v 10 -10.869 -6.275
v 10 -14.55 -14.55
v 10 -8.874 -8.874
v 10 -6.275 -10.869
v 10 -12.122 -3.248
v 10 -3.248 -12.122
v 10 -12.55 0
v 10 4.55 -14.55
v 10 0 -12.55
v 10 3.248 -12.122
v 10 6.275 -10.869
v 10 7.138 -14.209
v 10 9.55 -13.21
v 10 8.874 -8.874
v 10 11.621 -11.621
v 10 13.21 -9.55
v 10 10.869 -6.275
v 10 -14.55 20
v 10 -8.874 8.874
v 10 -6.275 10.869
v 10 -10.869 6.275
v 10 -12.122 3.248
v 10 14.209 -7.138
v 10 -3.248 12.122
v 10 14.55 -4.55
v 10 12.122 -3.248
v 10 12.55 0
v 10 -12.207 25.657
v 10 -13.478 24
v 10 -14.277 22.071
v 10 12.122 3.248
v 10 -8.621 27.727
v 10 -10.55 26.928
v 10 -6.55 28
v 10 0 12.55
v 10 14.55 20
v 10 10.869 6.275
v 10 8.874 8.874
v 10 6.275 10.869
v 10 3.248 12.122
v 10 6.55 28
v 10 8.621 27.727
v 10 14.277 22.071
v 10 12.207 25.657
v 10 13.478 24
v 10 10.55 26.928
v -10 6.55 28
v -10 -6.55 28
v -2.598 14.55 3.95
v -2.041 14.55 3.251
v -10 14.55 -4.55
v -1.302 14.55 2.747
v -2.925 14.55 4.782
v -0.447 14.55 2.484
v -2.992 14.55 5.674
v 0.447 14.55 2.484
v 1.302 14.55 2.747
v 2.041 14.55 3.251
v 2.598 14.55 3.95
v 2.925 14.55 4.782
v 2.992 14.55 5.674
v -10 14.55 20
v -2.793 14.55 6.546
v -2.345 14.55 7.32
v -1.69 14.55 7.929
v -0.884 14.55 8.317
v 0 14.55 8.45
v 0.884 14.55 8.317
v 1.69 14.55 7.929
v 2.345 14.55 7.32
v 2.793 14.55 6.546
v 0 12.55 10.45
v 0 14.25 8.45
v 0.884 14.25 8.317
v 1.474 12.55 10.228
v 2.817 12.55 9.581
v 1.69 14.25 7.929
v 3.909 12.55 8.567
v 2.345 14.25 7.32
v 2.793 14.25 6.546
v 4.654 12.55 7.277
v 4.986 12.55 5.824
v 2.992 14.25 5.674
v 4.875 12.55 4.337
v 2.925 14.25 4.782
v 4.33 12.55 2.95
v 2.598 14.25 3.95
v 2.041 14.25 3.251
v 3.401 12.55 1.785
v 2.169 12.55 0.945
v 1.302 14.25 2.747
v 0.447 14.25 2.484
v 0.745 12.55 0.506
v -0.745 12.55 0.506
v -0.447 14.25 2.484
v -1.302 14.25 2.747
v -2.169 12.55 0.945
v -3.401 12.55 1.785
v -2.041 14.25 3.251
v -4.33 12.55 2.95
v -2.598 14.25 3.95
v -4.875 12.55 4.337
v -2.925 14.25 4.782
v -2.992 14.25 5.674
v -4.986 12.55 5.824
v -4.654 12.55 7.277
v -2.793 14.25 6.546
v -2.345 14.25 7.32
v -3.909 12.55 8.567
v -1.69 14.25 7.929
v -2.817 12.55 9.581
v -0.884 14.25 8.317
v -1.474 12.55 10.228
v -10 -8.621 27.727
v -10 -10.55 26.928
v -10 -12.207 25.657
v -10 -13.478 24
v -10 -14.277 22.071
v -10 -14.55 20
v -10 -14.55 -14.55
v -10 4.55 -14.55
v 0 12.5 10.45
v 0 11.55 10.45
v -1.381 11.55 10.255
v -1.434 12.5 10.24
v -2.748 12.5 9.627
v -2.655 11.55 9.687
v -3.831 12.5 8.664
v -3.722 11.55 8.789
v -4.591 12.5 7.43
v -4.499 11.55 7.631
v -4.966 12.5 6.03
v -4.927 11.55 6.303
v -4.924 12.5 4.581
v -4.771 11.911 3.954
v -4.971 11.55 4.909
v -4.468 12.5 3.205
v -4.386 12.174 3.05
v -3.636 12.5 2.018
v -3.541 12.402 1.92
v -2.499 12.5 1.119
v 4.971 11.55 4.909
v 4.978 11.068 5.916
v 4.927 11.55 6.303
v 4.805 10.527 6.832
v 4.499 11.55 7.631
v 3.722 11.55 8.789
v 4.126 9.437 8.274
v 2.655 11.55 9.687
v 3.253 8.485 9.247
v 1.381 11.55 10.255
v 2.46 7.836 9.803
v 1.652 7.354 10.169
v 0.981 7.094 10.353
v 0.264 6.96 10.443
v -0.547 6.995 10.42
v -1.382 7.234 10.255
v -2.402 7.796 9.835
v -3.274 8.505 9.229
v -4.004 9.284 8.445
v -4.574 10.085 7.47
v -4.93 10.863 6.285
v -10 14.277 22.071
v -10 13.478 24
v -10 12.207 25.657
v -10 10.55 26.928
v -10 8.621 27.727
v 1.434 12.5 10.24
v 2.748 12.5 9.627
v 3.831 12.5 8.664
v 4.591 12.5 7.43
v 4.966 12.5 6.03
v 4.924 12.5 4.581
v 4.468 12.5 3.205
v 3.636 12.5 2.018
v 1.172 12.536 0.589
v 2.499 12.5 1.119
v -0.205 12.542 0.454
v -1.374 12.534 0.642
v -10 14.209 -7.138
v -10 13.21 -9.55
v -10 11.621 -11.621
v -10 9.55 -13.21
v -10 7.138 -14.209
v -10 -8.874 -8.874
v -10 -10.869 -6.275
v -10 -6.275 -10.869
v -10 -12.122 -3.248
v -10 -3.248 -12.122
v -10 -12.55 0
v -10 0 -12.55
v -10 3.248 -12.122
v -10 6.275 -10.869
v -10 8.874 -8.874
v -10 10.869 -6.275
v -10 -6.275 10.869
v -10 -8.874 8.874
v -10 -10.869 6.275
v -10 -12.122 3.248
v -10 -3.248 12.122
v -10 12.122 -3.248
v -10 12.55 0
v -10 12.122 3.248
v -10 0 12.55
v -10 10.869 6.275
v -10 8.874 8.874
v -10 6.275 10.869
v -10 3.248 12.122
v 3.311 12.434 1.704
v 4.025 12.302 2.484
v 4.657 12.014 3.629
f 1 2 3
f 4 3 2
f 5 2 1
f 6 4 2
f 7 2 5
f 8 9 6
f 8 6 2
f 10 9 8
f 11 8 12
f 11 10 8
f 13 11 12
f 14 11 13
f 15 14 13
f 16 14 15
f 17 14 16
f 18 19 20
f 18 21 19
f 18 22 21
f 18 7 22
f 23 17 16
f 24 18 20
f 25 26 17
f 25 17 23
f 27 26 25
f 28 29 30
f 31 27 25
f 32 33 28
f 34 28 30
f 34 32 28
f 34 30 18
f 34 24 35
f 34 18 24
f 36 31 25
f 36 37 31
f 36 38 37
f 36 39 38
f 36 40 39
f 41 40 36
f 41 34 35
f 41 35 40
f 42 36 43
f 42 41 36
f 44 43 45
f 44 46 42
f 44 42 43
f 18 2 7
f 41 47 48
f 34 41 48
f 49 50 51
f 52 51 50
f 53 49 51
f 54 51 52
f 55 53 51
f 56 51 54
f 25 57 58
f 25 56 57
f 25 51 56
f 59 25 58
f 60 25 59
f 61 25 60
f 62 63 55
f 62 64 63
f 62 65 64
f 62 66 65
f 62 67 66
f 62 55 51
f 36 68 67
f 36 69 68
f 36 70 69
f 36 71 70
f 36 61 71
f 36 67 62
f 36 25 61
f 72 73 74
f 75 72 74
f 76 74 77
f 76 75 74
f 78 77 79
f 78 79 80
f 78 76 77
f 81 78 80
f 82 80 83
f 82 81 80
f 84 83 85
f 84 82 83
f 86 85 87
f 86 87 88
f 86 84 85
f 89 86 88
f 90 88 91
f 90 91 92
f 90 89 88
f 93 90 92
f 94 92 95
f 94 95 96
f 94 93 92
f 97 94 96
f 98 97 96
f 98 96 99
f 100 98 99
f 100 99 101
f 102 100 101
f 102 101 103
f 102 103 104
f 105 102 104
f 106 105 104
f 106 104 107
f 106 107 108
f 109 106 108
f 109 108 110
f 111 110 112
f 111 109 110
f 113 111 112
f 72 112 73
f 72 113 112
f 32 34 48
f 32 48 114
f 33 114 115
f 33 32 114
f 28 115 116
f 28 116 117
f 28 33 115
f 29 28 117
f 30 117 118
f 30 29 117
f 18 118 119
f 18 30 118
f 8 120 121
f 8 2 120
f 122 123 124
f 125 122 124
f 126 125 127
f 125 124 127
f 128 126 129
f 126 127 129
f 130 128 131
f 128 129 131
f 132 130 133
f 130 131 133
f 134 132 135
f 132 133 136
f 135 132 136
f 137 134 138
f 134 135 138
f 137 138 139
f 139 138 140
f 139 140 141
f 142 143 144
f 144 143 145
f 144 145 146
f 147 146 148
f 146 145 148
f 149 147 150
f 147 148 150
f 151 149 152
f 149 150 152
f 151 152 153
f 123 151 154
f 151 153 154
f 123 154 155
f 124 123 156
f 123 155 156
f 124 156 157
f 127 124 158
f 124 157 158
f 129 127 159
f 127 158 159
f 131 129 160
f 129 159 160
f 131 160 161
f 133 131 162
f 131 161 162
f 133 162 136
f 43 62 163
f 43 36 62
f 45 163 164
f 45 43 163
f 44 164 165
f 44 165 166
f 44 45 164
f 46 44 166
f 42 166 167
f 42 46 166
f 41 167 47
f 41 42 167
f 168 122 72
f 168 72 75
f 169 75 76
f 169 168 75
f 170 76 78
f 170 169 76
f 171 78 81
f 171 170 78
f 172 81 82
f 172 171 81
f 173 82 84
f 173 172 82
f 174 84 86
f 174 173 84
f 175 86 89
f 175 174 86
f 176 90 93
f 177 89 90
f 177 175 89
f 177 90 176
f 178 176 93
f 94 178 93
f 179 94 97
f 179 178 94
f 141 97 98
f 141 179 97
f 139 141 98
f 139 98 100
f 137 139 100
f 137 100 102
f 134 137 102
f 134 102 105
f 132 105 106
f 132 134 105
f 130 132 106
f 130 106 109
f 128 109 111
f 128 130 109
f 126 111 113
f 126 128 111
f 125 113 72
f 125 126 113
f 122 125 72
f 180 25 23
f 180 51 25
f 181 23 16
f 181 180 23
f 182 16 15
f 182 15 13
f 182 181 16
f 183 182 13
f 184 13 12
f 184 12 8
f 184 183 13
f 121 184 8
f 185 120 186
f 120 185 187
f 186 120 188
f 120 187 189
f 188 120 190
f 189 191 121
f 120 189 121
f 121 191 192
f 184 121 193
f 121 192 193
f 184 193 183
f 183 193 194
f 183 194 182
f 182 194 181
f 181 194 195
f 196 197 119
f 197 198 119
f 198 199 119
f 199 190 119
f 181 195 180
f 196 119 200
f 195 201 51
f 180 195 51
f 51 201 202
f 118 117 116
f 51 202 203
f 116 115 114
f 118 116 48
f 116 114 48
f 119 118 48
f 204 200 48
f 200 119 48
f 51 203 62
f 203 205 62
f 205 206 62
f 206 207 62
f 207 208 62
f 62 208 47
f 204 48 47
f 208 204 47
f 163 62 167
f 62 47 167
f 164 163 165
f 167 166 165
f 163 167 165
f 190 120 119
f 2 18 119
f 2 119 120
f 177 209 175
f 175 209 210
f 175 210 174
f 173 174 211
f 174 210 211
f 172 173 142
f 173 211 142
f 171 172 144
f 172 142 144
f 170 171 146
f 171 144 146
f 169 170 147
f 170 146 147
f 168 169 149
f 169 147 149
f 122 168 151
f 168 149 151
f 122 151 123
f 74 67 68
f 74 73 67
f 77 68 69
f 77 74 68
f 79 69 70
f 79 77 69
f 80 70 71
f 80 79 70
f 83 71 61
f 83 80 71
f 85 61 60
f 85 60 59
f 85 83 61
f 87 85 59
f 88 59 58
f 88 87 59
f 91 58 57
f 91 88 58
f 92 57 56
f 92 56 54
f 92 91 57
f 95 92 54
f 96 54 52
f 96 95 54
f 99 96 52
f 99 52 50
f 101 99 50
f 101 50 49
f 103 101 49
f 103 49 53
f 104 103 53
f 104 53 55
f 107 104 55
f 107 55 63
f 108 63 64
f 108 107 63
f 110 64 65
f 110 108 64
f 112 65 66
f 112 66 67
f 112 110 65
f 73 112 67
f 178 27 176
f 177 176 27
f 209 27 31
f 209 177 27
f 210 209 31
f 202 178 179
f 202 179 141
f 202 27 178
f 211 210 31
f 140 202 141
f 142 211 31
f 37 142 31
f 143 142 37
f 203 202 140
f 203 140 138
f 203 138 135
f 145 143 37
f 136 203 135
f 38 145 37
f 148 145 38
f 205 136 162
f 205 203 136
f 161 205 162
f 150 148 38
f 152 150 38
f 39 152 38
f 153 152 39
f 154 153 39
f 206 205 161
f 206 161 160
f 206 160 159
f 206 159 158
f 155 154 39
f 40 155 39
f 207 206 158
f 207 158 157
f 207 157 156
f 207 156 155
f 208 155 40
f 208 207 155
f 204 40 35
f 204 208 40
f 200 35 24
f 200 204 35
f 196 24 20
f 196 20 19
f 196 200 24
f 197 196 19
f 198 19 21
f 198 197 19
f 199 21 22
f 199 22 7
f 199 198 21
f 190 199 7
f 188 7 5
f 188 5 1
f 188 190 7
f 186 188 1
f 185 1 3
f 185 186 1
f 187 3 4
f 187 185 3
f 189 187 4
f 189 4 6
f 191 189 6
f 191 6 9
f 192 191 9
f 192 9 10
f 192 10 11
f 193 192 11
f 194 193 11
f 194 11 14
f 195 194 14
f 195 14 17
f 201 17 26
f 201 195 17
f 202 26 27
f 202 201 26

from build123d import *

# Parameters (mm, degrees)
F0_R     = 12.55
F0_R_2   = 2.75
F0_R_3   = 4
F1_DEPTH = 10
F2_R     = 10
F3_R     = 2.9
F4_DEPTH = 14.551
F3_R_2   = 5
F5_DEPTH = 12.5


with BuildPart() as f1:
    # F0 (on Right) → F1 (new body, symmetric)
    with BuildSketch(Plane.YZ):
        with BuildLine():
            ThreePointArc((14.55, 20), (12.2068542495, 25.6568542495), (6.55, 28))
            Line((6.55, 28), (-6.55, 28))
            ThreePointArc((-6.55, 28), (-12.2068542495, 25.6568542495), (-14.55, 20))
            Line((-14.55, 20), (-14.55, -14.55))
            Line((-14.55, -14.55), (14.55, -14.55))
            Line((14.55, -14.55), (14.55, 20))
        make_face()
        Circle(F0_R, mode=Mode.SUBTRACT)
        with Locations((-6.8404028665, 18.7938524157)):
            Circle(F0_R_2, mode=Mode.SUBTRACT)
        with Locations((6.8404028665, 18.7938524157)):
            Circle(F0_R_3, mode=Mode.SUBTRACT)
        with Locations((6.8404028665, 18.7938524157)):
            Circle(F0_R_3)
        with Locations((-6.8404028665, 18.7938524157)):
            Circle(F0_R_2)
    extrude(amount=F1_DEPTH, both=True)

    # F2
    f2_edges = [f1.edges().sort_by_distance(p)[0] for p in [
        (0, 14.55, -14.55),
    ]]
    fillet(f2_edges, radius=F2_R)

    # F3 (on Front) → F4 (cut, through all)
    with BuildSketch(Plane.XZ):
        with Locations((0, 5.45)):
            Circle(F3_R)
    extrude(amount=-F4_DEPTH, mode=Mode.SUBTRACT)

    # F3 (on Front) → F5 (cut)
    with BuildSketch(Plane.XZ):
        with Locations((0, 5.45)):
            Circle(F3_R_2)
        with Locations((0, 5.45)):
            Circle(F3_R, mode=Mode.SUBTRACT)
    extrude(amount=-F5_DEPTH, mode=Mode.SUBTRACT)

    # F6 (on Right) → F7 (revolve, cut)
    with BuildSketch(Plane.YZ):
        Polygon((14.55, 5.45), (14.55, 8.45), (14.25, 8.45), (12.55, 10.45), (11.55, 10.45), (11.55, 5.45), align=None)
    revolve(axis=Axis((0, 7.275, 5.45), (0, 1, 0)), mode=Mode.SUBTRACT)


solid = f1.part
